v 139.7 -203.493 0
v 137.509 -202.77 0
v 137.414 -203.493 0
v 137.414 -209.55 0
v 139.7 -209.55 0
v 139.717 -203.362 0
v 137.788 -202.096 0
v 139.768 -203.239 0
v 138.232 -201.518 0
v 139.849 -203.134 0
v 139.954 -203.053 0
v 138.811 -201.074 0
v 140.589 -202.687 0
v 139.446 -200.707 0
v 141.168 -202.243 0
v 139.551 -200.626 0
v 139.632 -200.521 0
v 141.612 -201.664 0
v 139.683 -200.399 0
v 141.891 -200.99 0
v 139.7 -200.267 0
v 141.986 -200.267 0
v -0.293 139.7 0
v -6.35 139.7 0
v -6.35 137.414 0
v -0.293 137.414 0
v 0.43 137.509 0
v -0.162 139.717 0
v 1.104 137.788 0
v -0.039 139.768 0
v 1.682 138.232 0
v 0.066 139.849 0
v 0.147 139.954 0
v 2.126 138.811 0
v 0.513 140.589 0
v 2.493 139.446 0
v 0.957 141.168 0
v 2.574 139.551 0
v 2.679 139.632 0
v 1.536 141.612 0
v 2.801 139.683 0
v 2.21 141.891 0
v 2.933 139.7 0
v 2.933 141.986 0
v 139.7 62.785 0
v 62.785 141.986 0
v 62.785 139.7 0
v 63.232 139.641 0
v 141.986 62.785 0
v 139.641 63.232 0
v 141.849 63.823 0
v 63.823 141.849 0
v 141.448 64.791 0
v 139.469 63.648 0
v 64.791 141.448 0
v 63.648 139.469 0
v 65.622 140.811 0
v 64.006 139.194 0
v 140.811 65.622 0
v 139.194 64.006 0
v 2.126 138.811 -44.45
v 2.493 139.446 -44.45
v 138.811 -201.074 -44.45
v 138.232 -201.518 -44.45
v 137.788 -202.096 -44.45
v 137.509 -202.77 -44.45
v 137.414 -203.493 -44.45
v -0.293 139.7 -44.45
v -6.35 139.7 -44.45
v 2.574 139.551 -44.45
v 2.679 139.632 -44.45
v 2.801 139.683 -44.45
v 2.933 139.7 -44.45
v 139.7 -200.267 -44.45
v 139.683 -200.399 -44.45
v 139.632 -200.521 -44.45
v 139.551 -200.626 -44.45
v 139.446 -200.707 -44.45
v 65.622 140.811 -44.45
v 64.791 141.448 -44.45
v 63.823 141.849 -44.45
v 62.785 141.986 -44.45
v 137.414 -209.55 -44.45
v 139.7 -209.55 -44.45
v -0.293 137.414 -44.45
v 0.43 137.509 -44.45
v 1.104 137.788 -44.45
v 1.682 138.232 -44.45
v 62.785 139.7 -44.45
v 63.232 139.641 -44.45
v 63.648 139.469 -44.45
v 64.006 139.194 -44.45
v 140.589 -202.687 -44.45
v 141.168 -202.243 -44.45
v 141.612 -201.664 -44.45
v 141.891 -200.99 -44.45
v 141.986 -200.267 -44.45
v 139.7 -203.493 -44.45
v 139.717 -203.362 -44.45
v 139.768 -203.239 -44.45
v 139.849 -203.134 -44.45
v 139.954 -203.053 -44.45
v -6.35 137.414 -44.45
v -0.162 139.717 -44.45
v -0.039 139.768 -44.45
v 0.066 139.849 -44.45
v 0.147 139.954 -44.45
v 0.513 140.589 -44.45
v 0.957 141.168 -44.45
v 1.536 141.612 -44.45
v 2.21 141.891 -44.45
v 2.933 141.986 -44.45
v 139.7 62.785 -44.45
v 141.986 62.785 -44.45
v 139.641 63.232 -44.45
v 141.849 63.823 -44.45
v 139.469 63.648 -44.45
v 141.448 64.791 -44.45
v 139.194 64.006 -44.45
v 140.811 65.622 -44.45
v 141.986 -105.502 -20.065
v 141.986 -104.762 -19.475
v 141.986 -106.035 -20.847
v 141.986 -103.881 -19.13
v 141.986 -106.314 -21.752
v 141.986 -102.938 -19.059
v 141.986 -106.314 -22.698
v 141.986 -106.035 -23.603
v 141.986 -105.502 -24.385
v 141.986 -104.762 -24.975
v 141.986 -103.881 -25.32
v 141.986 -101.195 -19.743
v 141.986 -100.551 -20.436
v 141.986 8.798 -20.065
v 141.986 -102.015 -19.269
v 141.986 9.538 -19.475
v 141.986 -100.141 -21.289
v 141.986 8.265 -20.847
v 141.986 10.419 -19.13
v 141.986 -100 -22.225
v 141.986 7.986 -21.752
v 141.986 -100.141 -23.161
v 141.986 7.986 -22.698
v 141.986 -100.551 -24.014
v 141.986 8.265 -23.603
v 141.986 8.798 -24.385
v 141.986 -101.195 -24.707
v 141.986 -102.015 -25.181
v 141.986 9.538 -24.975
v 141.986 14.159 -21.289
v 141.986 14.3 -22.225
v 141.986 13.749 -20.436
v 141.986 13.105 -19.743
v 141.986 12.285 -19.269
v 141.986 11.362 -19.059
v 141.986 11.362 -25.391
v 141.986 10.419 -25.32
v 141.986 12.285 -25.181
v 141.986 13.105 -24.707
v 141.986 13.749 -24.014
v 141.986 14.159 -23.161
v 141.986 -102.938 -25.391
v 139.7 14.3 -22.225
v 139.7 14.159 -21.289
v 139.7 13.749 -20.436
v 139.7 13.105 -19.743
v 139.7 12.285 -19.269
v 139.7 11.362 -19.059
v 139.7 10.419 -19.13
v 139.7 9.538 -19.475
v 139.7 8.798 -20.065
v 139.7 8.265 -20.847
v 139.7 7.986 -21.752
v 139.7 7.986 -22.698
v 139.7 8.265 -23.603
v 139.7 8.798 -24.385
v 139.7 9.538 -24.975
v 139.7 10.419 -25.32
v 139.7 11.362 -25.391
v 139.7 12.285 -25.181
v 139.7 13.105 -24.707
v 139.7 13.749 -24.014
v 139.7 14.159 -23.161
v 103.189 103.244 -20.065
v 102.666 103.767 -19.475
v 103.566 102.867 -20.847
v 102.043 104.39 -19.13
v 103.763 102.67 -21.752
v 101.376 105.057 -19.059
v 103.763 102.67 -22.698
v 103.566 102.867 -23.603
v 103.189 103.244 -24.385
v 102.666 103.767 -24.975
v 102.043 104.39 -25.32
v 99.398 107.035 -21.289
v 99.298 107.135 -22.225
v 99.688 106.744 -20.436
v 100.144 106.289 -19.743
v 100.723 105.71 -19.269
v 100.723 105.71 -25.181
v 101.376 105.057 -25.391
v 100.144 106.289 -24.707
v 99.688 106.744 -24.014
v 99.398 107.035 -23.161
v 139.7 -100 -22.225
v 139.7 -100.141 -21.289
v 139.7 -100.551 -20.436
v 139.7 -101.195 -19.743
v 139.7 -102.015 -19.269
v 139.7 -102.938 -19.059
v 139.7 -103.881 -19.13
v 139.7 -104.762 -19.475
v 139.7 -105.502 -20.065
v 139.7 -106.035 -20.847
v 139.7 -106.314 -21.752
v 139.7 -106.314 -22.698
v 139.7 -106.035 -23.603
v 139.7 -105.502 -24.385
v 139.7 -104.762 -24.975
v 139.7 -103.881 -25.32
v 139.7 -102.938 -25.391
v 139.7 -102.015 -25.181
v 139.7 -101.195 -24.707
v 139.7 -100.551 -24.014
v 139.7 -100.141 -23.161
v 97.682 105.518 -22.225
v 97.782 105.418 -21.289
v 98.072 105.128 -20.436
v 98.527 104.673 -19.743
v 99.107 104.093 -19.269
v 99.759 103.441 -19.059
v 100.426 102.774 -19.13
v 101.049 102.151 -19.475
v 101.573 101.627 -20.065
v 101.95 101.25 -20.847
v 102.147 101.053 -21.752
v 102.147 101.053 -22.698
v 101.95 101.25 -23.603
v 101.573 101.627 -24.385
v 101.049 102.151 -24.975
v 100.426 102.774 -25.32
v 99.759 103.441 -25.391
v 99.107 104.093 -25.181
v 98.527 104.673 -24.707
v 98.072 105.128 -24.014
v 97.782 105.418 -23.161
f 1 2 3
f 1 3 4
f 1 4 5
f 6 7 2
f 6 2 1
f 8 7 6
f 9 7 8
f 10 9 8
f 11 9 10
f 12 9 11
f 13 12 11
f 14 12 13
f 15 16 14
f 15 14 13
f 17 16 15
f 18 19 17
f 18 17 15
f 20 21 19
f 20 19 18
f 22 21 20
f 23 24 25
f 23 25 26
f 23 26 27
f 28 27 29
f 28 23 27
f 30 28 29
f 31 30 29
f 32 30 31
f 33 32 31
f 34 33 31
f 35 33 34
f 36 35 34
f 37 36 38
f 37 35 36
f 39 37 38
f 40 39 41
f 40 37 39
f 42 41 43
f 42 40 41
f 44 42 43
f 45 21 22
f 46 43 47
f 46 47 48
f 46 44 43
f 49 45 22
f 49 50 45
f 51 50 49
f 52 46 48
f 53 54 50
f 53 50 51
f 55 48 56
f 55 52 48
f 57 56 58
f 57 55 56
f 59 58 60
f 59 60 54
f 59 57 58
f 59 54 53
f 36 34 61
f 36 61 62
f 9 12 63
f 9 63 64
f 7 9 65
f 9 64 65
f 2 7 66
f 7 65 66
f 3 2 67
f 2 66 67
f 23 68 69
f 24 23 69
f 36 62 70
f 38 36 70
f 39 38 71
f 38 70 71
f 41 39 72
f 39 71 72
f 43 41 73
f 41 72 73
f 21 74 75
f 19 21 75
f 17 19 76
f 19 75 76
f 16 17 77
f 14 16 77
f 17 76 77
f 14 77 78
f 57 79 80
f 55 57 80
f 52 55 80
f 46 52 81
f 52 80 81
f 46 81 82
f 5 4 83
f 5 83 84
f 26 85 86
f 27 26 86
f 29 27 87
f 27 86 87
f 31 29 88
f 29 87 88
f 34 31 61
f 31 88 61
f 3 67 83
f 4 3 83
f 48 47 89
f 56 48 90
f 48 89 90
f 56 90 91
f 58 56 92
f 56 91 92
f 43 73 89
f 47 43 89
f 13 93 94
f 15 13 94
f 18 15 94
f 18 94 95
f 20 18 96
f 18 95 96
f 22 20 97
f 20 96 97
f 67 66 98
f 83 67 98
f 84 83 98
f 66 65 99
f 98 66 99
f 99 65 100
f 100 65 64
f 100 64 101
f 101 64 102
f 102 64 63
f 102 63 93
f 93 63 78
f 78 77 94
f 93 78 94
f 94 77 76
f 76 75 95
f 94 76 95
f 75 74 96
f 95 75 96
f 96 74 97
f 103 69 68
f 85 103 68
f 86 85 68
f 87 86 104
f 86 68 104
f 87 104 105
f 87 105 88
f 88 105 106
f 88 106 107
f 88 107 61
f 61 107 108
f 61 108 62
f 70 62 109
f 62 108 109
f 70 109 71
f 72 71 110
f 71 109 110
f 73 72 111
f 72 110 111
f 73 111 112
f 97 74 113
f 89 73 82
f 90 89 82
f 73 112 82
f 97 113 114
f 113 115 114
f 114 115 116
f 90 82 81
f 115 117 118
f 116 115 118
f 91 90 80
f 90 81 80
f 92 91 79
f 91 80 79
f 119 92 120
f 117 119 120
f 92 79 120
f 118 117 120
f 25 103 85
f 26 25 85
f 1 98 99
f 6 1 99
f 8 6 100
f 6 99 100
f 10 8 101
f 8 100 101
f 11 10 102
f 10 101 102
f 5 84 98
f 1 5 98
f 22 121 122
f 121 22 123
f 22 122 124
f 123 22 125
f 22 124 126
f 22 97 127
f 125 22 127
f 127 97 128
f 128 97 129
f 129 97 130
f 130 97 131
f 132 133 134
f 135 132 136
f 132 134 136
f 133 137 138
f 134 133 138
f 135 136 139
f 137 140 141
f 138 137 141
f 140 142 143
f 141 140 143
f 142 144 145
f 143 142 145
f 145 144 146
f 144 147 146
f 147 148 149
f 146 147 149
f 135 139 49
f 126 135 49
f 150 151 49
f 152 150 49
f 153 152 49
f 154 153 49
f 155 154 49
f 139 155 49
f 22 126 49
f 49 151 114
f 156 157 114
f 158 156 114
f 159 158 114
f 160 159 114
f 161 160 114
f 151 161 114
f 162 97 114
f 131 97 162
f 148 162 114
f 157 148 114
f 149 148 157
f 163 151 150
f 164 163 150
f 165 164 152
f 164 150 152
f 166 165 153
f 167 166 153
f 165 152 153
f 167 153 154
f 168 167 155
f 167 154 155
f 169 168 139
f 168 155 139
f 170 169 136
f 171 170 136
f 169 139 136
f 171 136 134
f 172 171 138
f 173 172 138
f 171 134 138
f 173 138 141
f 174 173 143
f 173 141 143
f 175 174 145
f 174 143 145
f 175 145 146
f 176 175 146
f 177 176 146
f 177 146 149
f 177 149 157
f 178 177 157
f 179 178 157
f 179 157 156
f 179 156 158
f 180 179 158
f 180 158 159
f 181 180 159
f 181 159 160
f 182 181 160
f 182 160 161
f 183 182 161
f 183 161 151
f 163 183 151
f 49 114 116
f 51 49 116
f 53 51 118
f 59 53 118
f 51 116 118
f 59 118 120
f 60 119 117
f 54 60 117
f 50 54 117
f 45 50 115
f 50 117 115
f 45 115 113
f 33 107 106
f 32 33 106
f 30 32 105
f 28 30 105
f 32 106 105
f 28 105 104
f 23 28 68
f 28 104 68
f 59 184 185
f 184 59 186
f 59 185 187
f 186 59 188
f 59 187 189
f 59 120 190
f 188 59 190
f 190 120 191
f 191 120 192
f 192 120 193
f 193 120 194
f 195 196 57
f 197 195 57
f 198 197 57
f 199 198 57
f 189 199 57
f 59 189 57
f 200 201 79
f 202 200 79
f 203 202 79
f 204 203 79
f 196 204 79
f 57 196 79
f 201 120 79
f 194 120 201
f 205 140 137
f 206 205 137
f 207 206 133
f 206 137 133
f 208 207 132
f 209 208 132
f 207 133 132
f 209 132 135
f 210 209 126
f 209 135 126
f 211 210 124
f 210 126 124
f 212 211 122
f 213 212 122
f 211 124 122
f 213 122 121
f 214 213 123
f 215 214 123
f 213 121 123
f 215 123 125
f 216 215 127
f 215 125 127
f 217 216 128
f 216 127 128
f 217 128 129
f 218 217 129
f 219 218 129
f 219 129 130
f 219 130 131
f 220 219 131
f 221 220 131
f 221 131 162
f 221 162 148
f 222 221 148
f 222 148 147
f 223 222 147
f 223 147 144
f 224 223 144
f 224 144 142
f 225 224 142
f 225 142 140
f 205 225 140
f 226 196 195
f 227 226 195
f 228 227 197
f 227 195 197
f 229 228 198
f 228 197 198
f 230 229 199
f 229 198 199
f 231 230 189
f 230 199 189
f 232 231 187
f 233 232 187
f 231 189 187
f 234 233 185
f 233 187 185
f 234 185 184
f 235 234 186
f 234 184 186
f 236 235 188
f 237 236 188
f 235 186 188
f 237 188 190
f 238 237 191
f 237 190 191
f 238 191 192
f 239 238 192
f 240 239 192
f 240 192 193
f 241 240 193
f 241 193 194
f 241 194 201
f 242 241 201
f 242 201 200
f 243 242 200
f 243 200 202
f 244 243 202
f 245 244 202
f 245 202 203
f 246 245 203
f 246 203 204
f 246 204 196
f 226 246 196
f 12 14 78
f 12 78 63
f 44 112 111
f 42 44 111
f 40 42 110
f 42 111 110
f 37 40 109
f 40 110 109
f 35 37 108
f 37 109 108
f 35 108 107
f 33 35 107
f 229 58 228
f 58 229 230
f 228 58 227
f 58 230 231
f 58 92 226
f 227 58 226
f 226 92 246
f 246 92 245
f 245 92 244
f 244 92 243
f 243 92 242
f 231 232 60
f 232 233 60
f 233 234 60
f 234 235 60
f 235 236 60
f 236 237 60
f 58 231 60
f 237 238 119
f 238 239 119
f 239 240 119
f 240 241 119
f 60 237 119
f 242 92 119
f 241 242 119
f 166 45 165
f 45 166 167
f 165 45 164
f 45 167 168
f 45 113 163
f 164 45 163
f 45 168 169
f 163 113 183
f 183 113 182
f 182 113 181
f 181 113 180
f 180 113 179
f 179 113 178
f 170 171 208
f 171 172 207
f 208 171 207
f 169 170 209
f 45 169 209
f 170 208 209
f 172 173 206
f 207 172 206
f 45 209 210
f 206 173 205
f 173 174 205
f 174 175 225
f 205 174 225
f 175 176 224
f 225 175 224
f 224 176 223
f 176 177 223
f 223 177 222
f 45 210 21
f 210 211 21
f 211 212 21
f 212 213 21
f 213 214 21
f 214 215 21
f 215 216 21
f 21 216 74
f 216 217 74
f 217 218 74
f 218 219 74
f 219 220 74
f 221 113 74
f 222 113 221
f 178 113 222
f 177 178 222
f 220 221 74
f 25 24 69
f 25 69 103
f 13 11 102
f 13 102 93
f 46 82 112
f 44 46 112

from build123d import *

# Parameters (mm, degrees)
BASE_FLANGE1_START                     = -44.45
BASE_FLANGE1_DEPTH                     = 44.45
SKETCH2_R                              = 3.175
CE_00_HOLES_0_250_SIDE_2_PLACES_DEPTH  = 7.62
SKETCH4_R                              = 3.175
CE_00_HOLES_0_250_ANGLED_1_PLACE_DEPTH = 7.62


# Read off the part's stored shape, not the designer's step: Base-Flange1
with BuildPart() as part:
    # Base-Flange1 outline → Base-Flange1 (new body)
    with BuildSketch(Plane.XY.offset(BASE_FLANGE1_START)):
        with BuildLine():
            ThreePointArc((0.146646968, 139.954), (-0.039293937, 139.768059095), (-0.293293937, 139.7))
            Line((-0.293293937, 139.7), (-6.35, 139.7))
            Line((-6.35, 139.7), (-6.35, 137.414))
            Line((-6.35, 137.414), (-0.293293937, 137.414))
            ThreePointArc((-0.293293937, 137.414), (1.103706063, 137.788325022), (2.126381041, 138.811))
            Line((2.126381041, 138.811), (2.492998462, 139.446))
            ThreePointArc((2.492998462, 139.446), (2.678939367, 139.631940905), (2.932939367, 139.7))
            Line((2.932939367, 139.7), (62.784570335, 139.7))
            ThreePointArc((62.784570335, 139.7), (63.44554116, 139.568524729), (64.005885168, 139.194114832))
            Line((64.005885168, 139.194114832), (139.194114832, 64.005885168))
            ThreePointArc((139.194114832, 64.005885168), (139.568524729, 63.44554116), (139.7, 62.784570335))
            Line((139.7, 62.784570335), (139.7, -200.267060633))
            ThreePointArc((139.7, -200.267060633), (139.631940905, -200.521060633), (139.446, -200.707001538))
            Line((139.446, -200.707001538), (138.811, -201.073618959))
            ThreePointArc((138.811, -201.073618959), (137.788325022, -202.096293937), (137.414, -203.493293937))
            Line((137.414, -203.493293937), (137.414, -209.55))
            Line((137.414, -209.55), (139.7, -209.55))
            Line((139.7, -209.55), (139.7, -203.493293937))
            ThreePointArc((139.7, -203.493293937), (139.768059095, -203.239293937), (139.954, -203.053353032))
            Line((139.954, -203.053353032), (140.589, -202.686735611))
            ThreePointArc((140.589, -202.686735611), (141.611674978, -201.664060633), (141.986, -200.267060633))
            Line((141.986, -200.267060633), (141.986, 62.784570335))
            ThreePointArc((141.986, 62.784570335), (141.68051334, 64.320355486), (140.810560934, 65.622331269))
            Line((140.810560934, 65.622331269), (65.622331269, 140.810560934))
            ThreePointArc((65.622331269, 140.810560934), (64.320355486, 141.68051334), (62.784570335, 141.986))
            Line((62.784570335, 141.986), (2.932939367, 141.986))
            ThreePointArc((2.932939367, 141.986), (1.535939367, 141.611674978), (0.513264389, 140.589))
            Line((0.513264389, 140.589), (0.146646968, 139.954))
        make_face()
    extrude(amount=BASE_FLANGE1_DEPTH)

    # Sketch2 → CE-00 Holes 0.250 Side 2 Places (cut)
    with BuildSketch(Plane(origin=(141.986, 0, 0), x_dir=(0, 0, -1), z_dir=(1, 0, 0))):
        with Locations(Location((22.225, 11.1252, 0), (0, 0, 90))):
            Circle(SKETCH2_R)
        with Locations(Location((22.225, -103.1748, 0), (0, 0, 90))):
            Circle(SKETCH2_R)
    extrude(amount=-CE_00_HOLES_0_250_SIDE_2_PLACES_DEPTH, mode=Mode.SUBTRACT)

    # Sketch4 → CE-00 Holes 0.250 Angled 1 Place (cut)
    with BuildSketch(Plane(origin=(103.216446102, 103.216446102, 0), x_dir=(0, 0, -1), z_dir=(0.7071067811865511, 0.7071067811865439, 0))):
        with Locations(Location((22.225, 2.366107061, 0), (0, 0, 90))):
            Circle(SKETCH4_R)
    extrude(amount=-CE_00_HOLES_0_250_ANGLED_1_PLACE_DEPTH, mode=Mode.SUBTRACT)


solid = part.part
